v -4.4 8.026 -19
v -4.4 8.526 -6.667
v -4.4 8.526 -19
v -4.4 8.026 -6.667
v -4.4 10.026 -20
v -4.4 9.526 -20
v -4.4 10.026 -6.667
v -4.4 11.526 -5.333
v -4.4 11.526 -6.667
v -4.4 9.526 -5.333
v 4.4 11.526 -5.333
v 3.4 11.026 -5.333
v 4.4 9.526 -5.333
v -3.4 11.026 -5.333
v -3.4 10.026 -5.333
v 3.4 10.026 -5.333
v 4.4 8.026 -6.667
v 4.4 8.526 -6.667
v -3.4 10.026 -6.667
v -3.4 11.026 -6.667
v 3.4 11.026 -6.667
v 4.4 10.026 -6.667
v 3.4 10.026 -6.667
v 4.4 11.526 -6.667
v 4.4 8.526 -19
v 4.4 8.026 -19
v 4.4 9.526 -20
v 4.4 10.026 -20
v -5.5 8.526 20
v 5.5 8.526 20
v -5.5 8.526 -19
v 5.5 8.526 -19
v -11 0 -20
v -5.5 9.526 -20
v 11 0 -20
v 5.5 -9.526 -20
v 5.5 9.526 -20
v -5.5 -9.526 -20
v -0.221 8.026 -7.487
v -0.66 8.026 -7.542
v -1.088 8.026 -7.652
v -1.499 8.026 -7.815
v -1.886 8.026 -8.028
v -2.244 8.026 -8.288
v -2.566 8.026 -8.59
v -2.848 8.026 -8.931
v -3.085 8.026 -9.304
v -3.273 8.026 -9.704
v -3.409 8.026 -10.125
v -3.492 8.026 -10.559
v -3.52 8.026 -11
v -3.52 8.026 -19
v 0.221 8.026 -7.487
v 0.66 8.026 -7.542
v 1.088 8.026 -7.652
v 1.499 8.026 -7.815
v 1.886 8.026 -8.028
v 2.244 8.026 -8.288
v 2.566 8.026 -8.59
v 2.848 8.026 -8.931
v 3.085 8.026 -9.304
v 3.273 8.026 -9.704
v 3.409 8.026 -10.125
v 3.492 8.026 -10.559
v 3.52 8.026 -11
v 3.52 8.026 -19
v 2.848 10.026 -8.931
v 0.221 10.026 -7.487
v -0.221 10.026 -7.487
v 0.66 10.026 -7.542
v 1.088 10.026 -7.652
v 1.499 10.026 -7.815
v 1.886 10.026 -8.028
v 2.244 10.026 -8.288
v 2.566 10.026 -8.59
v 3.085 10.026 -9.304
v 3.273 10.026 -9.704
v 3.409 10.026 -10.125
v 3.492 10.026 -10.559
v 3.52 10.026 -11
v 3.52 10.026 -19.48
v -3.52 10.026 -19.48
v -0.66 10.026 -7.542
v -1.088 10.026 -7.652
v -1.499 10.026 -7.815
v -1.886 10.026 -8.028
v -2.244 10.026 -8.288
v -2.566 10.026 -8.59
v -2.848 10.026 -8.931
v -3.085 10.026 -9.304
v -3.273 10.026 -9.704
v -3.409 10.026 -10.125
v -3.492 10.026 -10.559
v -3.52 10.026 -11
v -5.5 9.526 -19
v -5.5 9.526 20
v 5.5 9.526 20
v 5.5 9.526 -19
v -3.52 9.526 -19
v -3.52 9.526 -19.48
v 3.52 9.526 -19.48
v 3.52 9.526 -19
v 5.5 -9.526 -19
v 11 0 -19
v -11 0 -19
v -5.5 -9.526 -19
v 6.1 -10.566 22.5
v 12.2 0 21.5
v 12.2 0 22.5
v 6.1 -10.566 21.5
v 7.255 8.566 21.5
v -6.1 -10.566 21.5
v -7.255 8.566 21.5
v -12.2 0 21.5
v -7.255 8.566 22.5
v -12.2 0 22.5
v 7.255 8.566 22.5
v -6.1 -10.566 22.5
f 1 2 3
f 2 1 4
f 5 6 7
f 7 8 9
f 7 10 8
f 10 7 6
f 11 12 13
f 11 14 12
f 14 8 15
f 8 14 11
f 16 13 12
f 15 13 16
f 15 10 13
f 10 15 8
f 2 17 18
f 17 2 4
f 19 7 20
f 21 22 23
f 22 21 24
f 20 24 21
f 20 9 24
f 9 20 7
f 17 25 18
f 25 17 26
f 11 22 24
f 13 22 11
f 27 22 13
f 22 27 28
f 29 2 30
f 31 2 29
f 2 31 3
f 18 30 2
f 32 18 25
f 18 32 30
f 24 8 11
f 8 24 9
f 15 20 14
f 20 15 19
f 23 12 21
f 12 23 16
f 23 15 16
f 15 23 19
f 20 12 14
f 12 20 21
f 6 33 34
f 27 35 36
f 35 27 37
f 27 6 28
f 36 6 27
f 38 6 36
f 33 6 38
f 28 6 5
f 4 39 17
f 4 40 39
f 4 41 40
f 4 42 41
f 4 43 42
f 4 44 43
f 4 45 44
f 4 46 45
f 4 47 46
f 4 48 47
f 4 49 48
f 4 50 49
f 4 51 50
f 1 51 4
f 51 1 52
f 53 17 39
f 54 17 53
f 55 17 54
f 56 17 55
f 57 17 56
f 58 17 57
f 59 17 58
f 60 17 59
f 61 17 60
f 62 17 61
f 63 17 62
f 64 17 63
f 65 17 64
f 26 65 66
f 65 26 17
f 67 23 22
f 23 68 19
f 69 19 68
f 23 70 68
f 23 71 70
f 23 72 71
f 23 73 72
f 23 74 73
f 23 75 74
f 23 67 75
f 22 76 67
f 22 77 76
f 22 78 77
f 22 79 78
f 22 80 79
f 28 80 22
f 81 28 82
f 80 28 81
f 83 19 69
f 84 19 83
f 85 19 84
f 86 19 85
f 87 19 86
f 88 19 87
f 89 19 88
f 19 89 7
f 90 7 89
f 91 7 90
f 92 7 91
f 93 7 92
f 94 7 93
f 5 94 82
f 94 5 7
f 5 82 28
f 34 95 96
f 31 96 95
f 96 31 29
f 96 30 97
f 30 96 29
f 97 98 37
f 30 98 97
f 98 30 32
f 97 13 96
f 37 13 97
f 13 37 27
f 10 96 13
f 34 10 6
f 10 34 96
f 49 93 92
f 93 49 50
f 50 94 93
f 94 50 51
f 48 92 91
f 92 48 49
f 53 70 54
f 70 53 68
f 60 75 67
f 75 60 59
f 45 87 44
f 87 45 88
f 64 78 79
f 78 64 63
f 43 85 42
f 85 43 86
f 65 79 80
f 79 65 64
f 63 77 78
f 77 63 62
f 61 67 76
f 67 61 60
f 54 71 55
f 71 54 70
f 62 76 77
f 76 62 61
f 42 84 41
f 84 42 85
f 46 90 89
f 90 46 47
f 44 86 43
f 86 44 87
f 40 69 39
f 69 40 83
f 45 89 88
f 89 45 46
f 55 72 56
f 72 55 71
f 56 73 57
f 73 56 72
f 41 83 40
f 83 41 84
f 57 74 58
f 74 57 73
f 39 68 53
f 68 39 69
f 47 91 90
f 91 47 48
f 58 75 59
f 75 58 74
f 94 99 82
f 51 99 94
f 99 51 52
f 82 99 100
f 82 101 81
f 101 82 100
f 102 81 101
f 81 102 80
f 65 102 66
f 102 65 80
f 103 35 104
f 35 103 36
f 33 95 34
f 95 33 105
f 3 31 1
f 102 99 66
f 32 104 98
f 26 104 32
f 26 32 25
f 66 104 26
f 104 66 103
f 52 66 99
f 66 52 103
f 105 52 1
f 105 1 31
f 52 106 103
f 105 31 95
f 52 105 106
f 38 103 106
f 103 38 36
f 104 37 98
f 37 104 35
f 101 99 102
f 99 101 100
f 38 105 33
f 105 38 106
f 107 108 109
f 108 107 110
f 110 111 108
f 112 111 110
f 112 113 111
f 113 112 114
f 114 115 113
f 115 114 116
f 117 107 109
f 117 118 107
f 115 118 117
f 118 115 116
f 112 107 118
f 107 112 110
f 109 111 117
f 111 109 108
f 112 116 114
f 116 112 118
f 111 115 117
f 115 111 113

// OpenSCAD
/**
 * Turm für Armageddon, parametrisierbar anpassbar für alle Platten.
 * @type {[type]}
 */
use <MCAD/regular_shapes.scad>


height = 40;
diameter = 22;
durchgang = [2];
tor = [3];

turm(height, diameter);

translate([0,0,22]) {
  color("#0000ff") turm(5, diameter+2.4, 2, true);
}

module turm(height, diameter,raiseFloor=0, zinnen=false) {
  side = diameter/2;
  radToSide = sqrt(3) * side / 2;
  union() {
    for(i = tor) {
      rotate([0, 0, 360-(i * 60)]) {
        difference() {
          union() {
            translate([0, -radToSide+.5, 0]) {
              seitenwand(height, side, zinnen, tor, durchgang);
            }
            translate([0,0,(-height/2)+raiseFloor]) {
              hexagon_prism(1, side);
              boden(side, radToSide);
            }
          }
          if (durchgang && zinnen) {
            cutbreite = side+10;
            translate([0, -radToSide+.5, 0]) {
              rotate([0, 0, 0]) {
              #cube([cutbreite,3, 6], center=true);
            }
          }}
        }
      }
    }
  }
}


module seitenwand(hoehe, breite, zinnen=false, tor=false, durchgang=false) {
  difference() {
    union() {
      cube([breite, 1, hoehe], center=true);
      if (tor && !zinnen) {
        translate([0,0,-hoehe/2]) tor(hoehe, breite);
      }
    }
    if (zinnen) {
      for (i=[-4,-1,2]) {
        translate([i,-2,1]) cube([1.5,3,2]);
      }
    }
    if (tor && !zinnen) {
      toroeffnung(hoehe, breite);
    }
    if (durchgang && !zinnen) {
      toroeffnung(hoehe, breite);
    }
  }
}

module tor(hoehe, breite) {
  color("Red"){
    torbreit = breite - breite/5;
    union() {
      translate([-torbreit/2,-1,0]) {
        cube([torbreit, 2, hoehe/3]);
      }
      difference() {
        translate([-torbreit/2,-2.5,hoehe/3]) {
          cube([torbreit, 3, hoehe/30]);
        }
        translate([-torbreit/2+1,-2,hoehe/3 -1]) {
          cube([torbreit-2, 1, hoehe/10]);
        }
      }
    }
  }
}

module toroeffnung(hoehe, breite) {
  $fn = 50;
  torbreit = breite - breite/5;
  torhoch = hoehe/3 - (hoehe/30);
  rundungdm = torbreit/2 -torbreit/10;
  //
  translate([0,2,-(torhoch)+1]) {
    union() {
      rotate([90,0,0]) {
        linear_extrude(4) {
          circle(rundungdm);
        }
      }
      translate([0,-2,-(torhoch-rundungdm)/2]) {
        cube([rundungdm*2, 4, torhoch-rundungdm], center=true);
      }
    }
  }

}



module boden(side, radToSide) {
  linear_extrude(1){
  polygon([
    [0,0],
    [side, 0],
    [radToSide/2,radToSide]
    ]);
  }
}
